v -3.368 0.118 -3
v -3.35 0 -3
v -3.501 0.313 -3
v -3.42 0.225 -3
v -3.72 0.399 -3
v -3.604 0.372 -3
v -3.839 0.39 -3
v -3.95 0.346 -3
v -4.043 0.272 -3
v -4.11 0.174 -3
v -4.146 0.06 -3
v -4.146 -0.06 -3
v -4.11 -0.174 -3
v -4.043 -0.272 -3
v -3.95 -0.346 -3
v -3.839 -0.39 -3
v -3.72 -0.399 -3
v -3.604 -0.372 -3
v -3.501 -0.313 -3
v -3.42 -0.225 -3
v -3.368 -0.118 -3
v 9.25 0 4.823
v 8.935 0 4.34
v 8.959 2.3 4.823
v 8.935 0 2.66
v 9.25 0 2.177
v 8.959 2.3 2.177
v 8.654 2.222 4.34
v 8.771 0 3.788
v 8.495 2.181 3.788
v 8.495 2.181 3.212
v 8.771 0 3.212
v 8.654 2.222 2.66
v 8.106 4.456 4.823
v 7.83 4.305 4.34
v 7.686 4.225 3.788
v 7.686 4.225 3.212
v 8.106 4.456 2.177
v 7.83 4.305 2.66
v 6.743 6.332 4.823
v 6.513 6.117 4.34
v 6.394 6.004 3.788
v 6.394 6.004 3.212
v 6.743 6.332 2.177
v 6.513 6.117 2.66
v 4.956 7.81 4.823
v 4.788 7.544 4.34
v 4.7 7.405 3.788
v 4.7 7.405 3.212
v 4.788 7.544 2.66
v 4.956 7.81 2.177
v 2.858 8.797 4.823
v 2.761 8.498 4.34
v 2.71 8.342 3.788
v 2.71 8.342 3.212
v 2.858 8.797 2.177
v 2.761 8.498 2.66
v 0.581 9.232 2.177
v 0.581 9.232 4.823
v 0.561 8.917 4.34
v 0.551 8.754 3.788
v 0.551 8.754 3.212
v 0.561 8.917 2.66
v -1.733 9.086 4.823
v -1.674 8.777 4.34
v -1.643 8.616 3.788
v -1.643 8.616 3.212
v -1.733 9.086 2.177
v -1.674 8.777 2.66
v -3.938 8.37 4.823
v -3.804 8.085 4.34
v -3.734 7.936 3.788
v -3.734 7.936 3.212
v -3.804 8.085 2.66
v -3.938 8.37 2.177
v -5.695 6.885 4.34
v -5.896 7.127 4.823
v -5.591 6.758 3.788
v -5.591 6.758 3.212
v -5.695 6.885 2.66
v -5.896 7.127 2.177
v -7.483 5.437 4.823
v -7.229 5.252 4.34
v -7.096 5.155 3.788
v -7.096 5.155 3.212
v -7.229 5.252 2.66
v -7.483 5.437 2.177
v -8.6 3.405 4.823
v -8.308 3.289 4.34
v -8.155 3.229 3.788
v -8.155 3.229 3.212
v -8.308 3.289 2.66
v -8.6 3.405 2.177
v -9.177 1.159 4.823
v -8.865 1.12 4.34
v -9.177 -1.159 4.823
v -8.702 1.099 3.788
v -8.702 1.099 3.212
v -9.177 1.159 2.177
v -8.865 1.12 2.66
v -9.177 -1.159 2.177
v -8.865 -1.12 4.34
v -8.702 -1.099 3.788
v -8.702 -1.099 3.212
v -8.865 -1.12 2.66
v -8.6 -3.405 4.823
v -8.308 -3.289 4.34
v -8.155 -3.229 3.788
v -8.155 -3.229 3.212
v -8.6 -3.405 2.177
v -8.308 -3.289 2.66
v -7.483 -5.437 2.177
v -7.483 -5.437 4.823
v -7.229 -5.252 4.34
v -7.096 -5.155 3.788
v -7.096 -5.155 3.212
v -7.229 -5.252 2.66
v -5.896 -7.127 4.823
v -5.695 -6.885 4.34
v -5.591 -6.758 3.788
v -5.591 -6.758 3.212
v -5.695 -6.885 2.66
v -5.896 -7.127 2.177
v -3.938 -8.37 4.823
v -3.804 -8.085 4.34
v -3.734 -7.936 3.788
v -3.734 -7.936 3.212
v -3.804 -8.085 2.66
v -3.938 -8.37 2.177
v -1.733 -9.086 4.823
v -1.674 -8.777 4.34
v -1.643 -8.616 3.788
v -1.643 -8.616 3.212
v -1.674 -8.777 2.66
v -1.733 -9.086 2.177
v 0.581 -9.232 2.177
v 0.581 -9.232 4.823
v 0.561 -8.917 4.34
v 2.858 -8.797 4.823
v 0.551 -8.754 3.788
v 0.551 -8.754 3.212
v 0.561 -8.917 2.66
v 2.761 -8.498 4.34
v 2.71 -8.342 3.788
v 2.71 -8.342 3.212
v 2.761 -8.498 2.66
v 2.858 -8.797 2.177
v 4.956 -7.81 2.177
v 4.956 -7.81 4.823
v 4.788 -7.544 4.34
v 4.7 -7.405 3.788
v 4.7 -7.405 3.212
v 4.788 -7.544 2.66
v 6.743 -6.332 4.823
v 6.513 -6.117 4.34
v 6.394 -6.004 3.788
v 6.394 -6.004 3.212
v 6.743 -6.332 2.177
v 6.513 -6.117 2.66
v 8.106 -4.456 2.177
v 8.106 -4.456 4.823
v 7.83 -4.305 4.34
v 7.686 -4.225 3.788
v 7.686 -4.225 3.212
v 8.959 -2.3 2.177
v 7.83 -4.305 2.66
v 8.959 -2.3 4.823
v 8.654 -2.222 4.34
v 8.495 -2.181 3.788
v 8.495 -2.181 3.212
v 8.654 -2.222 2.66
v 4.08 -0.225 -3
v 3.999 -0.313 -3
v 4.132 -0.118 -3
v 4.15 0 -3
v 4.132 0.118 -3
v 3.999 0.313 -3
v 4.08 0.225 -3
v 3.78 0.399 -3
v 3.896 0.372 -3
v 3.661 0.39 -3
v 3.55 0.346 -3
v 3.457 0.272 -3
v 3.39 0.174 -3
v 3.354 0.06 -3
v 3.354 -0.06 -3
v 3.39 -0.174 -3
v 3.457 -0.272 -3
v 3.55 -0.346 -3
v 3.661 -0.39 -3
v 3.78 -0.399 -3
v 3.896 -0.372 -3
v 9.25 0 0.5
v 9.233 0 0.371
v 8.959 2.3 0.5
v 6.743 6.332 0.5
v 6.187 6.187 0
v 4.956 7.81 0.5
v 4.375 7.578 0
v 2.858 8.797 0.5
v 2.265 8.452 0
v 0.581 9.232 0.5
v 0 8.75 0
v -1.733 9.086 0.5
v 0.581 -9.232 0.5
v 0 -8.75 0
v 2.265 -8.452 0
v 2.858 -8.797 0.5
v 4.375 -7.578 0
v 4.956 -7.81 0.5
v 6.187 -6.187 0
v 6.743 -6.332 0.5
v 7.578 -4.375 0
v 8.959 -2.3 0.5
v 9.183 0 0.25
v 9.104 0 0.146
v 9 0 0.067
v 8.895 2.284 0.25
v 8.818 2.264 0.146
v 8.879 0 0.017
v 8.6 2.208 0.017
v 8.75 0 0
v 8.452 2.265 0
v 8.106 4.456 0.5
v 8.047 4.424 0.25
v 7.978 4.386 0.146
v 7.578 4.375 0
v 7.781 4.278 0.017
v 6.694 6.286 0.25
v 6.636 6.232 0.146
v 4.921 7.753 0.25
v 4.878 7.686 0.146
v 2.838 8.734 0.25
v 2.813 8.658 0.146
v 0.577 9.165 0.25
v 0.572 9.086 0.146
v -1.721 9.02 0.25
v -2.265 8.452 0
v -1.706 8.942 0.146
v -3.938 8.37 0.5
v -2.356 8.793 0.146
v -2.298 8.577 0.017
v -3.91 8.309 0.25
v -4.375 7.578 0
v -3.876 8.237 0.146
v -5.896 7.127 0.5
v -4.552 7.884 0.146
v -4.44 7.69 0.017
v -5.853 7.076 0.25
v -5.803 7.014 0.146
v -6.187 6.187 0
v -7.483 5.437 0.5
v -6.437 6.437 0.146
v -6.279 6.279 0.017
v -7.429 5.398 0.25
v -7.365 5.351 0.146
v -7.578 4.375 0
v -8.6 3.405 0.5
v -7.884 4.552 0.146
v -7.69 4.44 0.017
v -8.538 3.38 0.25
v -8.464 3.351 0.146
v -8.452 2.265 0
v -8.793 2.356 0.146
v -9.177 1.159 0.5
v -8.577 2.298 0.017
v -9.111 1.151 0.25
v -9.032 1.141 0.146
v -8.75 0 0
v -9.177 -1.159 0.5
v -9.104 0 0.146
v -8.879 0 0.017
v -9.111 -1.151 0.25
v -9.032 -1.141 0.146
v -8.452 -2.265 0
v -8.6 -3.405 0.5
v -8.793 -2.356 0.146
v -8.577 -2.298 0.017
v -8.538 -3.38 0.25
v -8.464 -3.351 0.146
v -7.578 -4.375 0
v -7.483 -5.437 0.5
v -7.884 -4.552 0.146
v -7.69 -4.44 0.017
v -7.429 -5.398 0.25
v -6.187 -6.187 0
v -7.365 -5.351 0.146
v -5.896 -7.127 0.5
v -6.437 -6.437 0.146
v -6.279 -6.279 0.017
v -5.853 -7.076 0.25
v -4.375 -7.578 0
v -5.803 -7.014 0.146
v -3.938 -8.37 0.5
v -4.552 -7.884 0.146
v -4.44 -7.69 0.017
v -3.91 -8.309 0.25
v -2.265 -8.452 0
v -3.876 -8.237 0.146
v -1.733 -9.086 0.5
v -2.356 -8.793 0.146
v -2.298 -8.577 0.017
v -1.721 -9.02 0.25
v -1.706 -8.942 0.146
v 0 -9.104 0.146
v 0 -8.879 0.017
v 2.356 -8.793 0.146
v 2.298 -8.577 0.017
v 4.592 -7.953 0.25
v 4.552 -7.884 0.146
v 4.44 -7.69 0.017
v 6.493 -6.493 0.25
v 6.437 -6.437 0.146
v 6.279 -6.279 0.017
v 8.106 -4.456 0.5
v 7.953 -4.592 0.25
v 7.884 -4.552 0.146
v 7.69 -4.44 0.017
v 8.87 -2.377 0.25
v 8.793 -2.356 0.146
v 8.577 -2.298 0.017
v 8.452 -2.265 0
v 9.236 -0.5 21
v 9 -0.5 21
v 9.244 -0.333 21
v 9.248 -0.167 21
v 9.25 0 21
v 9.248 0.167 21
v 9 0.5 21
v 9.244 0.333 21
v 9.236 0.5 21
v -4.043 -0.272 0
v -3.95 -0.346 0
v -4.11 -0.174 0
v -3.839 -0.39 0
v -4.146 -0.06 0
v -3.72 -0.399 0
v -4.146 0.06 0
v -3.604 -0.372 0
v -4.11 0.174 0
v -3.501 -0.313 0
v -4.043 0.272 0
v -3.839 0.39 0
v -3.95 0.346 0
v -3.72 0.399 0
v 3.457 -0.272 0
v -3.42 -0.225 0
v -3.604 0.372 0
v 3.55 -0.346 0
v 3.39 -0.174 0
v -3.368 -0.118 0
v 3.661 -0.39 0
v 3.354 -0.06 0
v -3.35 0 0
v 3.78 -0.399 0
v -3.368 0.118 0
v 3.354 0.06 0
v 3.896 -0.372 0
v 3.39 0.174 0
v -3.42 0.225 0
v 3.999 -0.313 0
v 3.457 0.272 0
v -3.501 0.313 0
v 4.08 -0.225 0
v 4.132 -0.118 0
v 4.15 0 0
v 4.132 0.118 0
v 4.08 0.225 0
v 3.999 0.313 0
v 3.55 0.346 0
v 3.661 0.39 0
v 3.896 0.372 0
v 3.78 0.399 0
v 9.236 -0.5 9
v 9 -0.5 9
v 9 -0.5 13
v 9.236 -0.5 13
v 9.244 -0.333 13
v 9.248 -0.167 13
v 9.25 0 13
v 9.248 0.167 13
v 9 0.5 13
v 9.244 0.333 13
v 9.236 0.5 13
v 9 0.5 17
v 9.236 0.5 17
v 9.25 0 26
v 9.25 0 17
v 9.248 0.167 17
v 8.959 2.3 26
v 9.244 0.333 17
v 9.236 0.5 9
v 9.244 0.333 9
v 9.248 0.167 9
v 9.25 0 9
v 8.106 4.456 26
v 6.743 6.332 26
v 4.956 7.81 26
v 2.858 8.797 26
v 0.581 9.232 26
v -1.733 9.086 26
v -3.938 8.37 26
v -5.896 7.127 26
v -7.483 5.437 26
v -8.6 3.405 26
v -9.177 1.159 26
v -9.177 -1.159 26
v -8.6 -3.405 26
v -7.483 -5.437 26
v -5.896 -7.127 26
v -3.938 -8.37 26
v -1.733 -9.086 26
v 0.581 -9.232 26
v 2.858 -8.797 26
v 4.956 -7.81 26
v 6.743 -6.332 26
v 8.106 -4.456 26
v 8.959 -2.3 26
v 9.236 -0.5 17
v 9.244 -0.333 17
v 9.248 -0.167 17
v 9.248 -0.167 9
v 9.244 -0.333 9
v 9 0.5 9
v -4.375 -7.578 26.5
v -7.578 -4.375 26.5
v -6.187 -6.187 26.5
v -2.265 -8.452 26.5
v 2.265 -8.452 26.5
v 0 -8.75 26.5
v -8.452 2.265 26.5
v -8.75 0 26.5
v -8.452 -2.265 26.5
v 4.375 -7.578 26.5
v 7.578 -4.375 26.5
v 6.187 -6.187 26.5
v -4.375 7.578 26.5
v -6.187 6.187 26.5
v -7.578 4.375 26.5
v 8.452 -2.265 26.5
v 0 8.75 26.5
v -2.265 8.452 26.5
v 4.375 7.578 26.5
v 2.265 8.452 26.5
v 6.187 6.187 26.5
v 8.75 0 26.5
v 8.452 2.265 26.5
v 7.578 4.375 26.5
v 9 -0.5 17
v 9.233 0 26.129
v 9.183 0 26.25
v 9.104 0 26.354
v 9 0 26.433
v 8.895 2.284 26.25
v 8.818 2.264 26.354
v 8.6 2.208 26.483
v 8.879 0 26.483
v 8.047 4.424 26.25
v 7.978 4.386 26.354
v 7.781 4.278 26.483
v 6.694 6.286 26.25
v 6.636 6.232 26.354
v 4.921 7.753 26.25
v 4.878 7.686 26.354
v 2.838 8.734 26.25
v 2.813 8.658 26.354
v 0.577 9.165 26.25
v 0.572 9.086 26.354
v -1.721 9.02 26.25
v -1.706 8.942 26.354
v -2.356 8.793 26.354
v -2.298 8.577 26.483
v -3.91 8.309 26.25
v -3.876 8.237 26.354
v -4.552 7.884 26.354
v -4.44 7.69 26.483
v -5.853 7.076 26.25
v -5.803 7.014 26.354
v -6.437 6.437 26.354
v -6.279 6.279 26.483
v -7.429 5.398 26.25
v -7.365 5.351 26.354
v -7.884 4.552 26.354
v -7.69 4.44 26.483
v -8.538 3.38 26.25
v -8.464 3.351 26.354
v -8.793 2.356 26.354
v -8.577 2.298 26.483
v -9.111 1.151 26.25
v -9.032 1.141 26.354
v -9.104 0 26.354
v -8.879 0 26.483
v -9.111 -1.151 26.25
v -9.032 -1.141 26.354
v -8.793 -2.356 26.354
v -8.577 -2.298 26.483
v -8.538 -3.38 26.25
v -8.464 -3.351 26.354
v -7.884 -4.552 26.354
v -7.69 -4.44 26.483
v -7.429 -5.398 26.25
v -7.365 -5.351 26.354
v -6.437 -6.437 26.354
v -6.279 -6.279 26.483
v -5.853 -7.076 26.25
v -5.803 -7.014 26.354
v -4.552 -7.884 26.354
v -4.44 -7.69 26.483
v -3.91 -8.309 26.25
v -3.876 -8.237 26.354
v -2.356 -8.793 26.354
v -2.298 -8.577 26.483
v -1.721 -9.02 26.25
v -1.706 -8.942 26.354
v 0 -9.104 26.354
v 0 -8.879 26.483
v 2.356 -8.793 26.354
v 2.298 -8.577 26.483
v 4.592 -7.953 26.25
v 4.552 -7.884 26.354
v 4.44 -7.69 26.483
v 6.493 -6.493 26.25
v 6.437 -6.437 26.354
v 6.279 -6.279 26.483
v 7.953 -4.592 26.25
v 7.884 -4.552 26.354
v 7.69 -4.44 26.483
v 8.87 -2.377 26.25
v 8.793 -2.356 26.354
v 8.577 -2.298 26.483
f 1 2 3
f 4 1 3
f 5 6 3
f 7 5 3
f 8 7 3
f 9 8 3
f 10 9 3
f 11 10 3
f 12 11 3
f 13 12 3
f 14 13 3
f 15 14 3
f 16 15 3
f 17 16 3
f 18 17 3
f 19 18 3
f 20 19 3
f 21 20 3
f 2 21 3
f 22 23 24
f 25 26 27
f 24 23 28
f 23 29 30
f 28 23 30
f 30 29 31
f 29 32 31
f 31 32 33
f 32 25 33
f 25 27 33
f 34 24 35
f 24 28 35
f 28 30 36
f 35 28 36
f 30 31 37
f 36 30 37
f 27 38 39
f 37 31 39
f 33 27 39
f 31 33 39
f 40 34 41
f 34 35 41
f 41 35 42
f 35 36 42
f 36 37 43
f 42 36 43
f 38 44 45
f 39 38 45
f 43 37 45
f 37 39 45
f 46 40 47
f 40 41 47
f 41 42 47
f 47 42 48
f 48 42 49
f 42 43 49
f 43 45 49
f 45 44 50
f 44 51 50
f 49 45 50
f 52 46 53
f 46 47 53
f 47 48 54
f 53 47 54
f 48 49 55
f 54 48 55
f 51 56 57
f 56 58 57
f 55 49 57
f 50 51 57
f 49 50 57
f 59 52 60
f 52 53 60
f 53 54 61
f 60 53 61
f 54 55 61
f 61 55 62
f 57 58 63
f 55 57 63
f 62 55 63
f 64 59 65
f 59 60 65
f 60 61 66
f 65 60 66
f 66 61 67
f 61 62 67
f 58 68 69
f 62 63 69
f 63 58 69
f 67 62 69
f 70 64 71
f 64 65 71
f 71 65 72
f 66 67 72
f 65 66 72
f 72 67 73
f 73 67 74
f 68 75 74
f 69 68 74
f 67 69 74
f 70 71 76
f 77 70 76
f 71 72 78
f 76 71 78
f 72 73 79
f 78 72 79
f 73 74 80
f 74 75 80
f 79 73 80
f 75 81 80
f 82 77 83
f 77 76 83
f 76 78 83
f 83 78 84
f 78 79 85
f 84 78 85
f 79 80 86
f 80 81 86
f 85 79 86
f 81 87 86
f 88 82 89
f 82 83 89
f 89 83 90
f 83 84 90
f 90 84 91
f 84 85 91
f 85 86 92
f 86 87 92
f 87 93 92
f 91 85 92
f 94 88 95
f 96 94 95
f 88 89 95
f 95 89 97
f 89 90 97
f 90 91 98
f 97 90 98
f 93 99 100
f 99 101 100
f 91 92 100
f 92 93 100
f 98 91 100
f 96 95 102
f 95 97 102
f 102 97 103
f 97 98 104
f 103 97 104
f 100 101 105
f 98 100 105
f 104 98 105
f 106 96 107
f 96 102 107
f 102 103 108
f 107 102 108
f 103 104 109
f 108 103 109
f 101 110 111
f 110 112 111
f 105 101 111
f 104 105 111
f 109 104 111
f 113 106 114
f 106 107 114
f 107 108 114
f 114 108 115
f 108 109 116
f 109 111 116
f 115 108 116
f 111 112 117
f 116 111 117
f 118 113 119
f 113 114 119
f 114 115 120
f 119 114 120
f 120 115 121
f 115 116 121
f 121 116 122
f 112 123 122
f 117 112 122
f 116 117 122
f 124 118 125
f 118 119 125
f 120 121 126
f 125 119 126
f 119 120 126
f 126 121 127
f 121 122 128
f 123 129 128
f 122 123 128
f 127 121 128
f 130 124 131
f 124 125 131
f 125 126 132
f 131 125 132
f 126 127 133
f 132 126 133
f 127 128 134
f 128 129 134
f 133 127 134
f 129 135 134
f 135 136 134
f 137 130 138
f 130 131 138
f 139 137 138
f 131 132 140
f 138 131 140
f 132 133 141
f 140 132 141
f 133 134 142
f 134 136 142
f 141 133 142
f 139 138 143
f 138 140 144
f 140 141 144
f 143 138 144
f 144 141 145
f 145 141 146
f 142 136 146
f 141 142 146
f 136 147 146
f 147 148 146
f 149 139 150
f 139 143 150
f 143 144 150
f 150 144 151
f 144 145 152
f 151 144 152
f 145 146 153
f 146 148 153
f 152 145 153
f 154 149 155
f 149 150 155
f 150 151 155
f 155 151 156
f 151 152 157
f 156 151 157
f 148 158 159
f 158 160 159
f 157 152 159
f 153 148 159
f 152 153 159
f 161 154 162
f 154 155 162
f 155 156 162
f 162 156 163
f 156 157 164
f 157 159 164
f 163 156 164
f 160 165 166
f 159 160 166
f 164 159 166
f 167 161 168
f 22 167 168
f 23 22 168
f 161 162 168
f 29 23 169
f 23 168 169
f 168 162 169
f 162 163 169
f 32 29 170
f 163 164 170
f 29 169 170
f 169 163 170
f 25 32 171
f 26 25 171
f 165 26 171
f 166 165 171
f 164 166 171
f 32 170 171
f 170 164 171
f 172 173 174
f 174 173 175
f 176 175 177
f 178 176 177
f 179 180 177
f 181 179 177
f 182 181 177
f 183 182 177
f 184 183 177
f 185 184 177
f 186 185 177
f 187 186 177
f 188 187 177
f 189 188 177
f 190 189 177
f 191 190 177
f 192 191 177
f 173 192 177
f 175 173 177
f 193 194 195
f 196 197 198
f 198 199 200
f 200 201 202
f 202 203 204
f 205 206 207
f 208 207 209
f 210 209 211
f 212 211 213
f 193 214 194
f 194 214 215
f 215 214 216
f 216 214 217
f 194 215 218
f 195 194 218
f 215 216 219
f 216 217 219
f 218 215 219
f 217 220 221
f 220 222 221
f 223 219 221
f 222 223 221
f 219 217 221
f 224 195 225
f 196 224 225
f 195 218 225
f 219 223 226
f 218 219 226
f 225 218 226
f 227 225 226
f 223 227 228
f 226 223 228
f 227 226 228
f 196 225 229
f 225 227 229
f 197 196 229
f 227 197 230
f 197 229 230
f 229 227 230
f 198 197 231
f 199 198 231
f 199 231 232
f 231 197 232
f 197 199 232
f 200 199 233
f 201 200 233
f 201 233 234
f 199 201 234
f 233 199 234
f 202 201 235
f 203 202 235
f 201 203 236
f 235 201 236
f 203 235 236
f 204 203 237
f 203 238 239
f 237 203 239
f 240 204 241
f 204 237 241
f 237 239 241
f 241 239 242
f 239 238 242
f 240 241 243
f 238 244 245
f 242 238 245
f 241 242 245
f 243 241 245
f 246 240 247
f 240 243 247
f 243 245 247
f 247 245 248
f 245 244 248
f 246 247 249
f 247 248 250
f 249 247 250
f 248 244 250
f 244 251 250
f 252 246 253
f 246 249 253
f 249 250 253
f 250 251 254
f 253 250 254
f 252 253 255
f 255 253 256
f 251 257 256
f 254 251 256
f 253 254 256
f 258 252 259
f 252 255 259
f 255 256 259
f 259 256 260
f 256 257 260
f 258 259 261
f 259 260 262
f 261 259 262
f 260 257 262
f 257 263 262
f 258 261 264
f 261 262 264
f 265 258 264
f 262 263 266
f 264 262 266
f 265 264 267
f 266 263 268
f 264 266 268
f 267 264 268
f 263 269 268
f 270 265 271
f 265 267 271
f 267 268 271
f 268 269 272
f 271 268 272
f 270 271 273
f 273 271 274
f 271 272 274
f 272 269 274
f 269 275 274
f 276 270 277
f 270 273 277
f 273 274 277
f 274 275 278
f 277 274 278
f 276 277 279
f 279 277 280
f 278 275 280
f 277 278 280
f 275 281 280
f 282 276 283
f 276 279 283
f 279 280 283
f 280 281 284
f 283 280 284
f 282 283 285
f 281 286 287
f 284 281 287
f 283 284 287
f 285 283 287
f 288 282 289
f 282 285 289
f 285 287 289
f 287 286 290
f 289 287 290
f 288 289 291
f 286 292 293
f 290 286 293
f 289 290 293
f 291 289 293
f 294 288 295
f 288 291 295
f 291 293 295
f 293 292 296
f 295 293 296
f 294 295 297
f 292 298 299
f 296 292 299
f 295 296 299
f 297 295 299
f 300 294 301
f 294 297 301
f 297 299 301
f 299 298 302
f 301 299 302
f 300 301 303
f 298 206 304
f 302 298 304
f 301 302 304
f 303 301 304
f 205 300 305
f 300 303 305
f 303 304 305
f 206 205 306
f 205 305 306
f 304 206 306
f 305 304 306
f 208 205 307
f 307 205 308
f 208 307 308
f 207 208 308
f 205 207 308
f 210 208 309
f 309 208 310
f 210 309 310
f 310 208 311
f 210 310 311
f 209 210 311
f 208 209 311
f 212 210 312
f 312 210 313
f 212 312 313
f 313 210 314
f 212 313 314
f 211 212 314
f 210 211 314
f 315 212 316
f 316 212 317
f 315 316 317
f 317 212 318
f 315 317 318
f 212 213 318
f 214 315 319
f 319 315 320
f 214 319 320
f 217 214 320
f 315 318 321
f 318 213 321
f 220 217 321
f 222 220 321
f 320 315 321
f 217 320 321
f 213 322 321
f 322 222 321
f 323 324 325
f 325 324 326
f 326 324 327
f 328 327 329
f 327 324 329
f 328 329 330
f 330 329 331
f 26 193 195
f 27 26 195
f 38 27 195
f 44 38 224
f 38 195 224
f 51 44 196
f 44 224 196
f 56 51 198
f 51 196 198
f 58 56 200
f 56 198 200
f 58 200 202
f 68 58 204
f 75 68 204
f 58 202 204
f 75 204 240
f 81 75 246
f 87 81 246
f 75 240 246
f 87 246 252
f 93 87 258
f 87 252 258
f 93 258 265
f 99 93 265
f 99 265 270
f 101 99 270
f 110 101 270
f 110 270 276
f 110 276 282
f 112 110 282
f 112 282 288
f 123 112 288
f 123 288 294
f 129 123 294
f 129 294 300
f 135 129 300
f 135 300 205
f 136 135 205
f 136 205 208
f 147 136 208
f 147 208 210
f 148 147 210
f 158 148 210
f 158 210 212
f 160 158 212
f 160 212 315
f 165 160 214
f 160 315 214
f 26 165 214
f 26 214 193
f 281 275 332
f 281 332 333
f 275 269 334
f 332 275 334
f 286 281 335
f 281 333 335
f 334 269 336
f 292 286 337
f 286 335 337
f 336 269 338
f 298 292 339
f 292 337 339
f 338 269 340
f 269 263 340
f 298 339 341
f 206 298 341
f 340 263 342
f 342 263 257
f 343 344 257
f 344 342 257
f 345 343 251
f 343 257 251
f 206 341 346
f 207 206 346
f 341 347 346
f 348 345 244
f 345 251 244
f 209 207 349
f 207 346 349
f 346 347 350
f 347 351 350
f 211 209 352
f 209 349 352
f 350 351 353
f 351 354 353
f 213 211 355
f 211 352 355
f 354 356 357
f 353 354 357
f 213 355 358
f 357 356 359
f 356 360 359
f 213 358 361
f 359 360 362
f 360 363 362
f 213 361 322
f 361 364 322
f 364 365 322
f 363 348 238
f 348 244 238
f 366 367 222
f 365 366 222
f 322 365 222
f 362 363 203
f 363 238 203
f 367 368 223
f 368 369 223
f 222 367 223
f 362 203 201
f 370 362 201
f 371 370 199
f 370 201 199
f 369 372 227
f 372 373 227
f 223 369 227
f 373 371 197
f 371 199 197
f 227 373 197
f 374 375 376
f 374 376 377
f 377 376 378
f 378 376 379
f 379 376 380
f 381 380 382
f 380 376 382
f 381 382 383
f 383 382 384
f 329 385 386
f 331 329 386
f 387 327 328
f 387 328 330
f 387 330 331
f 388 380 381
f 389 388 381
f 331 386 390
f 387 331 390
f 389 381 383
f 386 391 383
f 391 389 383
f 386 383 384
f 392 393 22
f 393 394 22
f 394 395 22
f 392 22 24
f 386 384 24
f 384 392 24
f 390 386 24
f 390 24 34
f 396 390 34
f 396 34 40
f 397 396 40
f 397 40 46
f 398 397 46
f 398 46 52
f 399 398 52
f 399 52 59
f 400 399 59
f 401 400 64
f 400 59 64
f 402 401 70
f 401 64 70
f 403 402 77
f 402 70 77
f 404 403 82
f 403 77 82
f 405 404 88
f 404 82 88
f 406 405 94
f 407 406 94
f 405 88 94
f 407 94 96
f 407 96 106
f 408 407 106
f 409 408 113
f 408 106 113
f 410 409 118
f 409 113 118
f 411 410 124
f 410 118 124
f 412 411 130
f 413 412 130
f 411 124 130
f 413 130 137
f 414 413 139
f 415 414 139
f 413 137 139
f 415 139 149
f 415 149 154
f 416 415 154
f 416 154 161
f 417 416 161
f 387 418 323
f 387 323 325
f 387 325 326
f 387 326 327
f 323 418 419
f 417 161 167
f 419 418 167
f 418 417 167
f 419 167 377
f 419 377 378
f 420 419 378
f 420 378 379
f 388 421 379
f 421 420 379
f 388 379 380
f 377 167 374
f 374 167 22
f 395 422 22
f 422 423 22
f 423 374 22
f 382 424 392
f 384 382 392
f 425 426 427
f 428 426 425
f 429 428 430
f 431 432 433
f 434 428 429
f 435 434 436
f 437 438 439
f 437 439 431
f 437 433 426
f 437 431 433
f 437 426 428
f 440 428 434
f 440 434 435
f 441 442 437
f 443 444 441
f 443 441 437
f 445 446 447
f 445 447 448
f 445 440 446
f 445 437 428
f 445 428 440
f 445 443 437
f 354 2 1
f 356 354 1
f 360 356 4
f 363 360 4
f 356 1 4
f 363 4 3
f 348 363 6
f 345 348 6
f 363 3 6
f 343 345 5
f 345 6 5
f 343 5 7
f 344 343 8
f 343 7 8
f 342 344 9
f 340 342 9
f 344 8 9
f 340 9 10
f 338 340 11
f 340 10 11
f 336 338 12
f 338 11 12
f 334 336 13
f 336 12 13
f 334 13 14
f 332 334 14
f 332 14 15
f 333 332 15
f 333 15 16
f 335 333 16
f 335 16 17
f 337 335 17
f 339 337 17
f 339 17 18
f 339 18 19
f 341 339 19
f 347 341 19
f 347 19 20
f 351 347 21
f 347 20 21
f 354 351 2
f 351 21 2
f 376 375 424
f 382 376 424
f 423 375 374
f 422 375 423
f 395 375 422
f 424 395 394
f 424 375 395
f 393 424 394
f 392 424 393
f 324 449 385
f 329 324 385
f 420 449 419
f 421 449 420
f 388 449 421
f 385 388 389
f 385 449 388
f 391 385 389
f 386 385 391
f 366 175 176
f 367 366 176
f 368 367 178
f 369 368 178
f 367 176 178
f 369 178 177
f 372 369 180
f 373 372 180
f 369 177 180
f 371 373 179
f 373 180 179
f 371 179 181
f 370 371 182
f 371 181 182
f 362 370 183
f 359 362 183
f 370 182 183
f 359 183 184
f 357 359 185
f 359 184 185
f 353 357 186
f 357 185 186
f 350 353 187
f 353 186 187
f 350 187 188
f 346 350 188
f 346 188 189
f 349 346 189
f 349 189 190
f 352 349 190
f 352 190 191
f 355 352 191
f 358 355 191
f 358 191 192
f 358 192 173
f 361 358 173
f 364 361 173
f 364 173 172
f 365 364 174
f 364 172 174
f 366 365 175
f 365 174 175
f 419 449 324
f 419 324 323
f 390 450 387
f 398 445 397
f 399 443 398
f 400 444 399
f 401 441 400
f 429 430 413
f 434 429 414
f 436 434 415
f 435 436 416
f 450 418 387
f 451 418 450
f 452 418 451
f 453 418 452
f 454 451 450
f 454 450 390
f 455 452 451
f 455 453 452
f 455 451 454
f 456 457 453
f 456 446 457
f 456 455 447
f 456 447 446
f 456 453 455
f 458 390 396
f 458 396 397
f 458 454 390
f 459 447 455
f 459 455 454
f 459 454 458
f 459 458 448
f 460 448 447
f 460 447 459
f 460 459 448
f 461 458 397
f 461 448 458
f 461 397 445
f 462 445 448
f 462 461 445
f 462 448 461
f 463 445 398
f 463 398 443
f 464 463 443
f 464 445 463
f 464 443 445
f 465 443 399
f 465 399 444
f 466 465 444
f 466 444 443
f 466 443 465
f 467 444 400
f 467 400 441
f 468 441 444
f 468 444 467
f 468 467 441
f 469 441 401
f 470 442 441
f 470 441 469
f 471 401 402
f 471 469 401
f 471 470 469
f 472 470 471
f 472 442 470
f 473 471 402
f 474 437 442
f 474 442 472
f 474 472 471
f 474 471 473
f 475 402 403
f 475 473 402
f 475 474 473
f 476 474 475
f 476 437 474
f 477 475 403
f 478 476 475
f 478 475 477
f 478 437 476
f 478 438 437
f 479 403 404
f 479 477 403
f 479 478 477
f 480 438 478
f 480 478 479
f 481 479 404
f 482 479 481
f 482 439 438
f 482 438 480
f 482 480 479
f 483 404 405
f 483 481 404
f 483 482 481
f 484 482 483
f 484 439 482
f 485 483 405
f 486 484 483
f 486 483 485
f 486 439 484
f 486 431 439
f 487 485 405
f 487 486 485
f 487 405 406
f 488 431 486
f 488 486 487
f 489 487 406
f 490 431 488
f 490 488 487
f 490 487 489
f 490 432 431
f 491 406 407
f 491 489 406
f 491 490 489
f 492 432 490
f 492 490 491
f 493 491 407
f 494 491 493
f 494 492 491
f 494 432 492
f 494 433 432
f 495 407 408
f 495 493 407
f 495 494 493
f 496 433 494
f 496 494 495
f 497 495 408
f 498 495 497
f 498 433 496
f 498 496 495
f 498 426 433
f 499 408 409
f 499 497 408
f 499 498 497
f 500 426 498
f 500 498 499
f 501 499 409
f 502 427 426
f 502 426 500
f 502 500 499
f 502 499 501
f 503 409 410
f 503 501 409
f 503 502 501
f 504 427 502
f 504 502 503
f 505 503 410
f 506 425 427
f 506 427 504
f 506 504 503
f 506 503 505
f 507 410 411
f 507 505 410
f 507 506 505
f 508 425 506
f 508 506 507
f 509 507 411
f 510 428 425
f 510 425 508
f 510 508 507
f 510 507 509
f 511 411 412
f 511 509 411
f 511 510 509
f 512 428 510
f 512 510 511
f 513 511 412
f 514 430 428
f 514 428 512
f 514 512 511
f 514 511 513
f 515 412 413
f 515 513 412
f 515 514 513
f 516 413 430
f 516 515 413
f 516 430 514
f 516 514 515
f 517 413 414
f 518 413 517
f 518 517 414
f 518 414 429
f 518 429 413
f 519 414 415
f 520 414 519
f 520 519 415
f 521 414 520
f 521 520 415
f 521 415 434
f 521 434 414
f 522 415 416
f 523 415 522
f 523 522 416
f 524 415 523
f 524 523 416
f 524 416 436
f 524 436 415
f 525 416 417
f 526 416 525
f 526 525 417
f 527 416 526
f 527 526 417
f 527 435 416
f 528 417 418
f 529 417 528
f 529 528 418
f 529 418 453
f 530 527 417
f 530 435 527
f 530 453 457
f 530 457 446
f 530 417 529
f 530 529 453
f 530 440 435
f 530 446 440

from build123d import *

# Parameters (mm, degrees)
CYLINDER002_R     = 0.4
CYLINDER002_DEPTH = 3
CYLINDER001_R     = 0.4
CYLINDER001_DEPTH = 3
BOX001_W          = 1
BOX001_H          = 1
BOX001_DEPTH      = 4
BOX_W             = 1
BOX_H             = 1
BOX_DEPTH         = 4
TORUS_R           = 2
CYLINDER_R        = 9.25
CYLINDER_DEPTH    = 26.5
FILLET_R          = 0.5


with BuildPart() as pin2:
    # Cylinder002 → Cylinder002 (new body)
    with BuildSketch(Plane(origin=(3.75, 0, -3), x_dir=(1, 0, 0), z_dir=(0, 0, 1))):
        Circle(CYLINDER002_R)
    extrude(amount=CYLINDER002_DEPTH)


with BuildPart() as pin1:
    # Cylinder001 → Cylinder001 (new body)
    with BuildSketch(Plane(origin=(-3.75, 0, -3), x_dir=(1, 0, 0), z_dir=(0, 0, 1))):
        Circle(CYLINDER001_R)
    extrude(amount=CYLINDER001_DEPTH)


with BuildPart() as box001:
    # Box001 → Box001 (new body)
    with BuildSketch(Plane(origin=(9, -0.5, 17), x_dir=(1, 0, 0), z_dir=(0, 0, 1))):
        with Locations((0.5, 0.5)):
            Rectangle(BOX001_W, BOX001_H)
    extrude(amount=BOX001_DEPTH)


with BuildPart() as box:
    # Box → Box (new body)
    with BuildSketch(Plane(origin=(9, -0.5, 9), x_dir=(1, 0, 0), z_dir=(0, 0, 1))):
        with Locations((0.5, 0.5)):
            Rectangle(BOX_W, BOX_H)
    extrude(amount=BOX_DEPTH)


with BuildPart() as ring:
    # Torus → Torus (revolve)
    with BuildSketch(Plane(origin=(0, 0, 3.5), x_dir=(1, 0, 0), z_dir=(0, -1, 0))):
        with Locations((10.75, 0)):
            Circle(TORUS_R)
    revolve(axis=Axis((0, 0, 3.5), (0, 0, 1)))


with BuildPart() as cappr750w80d1800h2500:
    # Cylinder → Cylinder (new body)
    with BuildSketch(Plane.XY):
        Circle(CYLINDER_R)
    extrude(amount=CYLINDER_DEPTH)

    # Fillet
    fillet_edges = [cappr750w80d1800h2500.edges().sort_by_distance(p)[0] for p in [
        (-9.25, 0, 26.5),
        (-9.25, 0, 0),
    ]]
    fillet(fillet_edges, radius=FILLET_R)

    # Cut: cut Ring
    add(ring.part, mode=Mode.SUBTRACT)

    # Cut001: cut Box
    add(box.part, mode=Mode.SUBTRACT)

    # Cut002: cut Box001
    add(box001.part, mode=Mode.SUBTRACT)

    # Fusion: union Pin1+
    add(pin1.part)

    # Fusion001: union Pin2-
    add(pin2.part)


solid = cappr750w80d1800h2500.part
